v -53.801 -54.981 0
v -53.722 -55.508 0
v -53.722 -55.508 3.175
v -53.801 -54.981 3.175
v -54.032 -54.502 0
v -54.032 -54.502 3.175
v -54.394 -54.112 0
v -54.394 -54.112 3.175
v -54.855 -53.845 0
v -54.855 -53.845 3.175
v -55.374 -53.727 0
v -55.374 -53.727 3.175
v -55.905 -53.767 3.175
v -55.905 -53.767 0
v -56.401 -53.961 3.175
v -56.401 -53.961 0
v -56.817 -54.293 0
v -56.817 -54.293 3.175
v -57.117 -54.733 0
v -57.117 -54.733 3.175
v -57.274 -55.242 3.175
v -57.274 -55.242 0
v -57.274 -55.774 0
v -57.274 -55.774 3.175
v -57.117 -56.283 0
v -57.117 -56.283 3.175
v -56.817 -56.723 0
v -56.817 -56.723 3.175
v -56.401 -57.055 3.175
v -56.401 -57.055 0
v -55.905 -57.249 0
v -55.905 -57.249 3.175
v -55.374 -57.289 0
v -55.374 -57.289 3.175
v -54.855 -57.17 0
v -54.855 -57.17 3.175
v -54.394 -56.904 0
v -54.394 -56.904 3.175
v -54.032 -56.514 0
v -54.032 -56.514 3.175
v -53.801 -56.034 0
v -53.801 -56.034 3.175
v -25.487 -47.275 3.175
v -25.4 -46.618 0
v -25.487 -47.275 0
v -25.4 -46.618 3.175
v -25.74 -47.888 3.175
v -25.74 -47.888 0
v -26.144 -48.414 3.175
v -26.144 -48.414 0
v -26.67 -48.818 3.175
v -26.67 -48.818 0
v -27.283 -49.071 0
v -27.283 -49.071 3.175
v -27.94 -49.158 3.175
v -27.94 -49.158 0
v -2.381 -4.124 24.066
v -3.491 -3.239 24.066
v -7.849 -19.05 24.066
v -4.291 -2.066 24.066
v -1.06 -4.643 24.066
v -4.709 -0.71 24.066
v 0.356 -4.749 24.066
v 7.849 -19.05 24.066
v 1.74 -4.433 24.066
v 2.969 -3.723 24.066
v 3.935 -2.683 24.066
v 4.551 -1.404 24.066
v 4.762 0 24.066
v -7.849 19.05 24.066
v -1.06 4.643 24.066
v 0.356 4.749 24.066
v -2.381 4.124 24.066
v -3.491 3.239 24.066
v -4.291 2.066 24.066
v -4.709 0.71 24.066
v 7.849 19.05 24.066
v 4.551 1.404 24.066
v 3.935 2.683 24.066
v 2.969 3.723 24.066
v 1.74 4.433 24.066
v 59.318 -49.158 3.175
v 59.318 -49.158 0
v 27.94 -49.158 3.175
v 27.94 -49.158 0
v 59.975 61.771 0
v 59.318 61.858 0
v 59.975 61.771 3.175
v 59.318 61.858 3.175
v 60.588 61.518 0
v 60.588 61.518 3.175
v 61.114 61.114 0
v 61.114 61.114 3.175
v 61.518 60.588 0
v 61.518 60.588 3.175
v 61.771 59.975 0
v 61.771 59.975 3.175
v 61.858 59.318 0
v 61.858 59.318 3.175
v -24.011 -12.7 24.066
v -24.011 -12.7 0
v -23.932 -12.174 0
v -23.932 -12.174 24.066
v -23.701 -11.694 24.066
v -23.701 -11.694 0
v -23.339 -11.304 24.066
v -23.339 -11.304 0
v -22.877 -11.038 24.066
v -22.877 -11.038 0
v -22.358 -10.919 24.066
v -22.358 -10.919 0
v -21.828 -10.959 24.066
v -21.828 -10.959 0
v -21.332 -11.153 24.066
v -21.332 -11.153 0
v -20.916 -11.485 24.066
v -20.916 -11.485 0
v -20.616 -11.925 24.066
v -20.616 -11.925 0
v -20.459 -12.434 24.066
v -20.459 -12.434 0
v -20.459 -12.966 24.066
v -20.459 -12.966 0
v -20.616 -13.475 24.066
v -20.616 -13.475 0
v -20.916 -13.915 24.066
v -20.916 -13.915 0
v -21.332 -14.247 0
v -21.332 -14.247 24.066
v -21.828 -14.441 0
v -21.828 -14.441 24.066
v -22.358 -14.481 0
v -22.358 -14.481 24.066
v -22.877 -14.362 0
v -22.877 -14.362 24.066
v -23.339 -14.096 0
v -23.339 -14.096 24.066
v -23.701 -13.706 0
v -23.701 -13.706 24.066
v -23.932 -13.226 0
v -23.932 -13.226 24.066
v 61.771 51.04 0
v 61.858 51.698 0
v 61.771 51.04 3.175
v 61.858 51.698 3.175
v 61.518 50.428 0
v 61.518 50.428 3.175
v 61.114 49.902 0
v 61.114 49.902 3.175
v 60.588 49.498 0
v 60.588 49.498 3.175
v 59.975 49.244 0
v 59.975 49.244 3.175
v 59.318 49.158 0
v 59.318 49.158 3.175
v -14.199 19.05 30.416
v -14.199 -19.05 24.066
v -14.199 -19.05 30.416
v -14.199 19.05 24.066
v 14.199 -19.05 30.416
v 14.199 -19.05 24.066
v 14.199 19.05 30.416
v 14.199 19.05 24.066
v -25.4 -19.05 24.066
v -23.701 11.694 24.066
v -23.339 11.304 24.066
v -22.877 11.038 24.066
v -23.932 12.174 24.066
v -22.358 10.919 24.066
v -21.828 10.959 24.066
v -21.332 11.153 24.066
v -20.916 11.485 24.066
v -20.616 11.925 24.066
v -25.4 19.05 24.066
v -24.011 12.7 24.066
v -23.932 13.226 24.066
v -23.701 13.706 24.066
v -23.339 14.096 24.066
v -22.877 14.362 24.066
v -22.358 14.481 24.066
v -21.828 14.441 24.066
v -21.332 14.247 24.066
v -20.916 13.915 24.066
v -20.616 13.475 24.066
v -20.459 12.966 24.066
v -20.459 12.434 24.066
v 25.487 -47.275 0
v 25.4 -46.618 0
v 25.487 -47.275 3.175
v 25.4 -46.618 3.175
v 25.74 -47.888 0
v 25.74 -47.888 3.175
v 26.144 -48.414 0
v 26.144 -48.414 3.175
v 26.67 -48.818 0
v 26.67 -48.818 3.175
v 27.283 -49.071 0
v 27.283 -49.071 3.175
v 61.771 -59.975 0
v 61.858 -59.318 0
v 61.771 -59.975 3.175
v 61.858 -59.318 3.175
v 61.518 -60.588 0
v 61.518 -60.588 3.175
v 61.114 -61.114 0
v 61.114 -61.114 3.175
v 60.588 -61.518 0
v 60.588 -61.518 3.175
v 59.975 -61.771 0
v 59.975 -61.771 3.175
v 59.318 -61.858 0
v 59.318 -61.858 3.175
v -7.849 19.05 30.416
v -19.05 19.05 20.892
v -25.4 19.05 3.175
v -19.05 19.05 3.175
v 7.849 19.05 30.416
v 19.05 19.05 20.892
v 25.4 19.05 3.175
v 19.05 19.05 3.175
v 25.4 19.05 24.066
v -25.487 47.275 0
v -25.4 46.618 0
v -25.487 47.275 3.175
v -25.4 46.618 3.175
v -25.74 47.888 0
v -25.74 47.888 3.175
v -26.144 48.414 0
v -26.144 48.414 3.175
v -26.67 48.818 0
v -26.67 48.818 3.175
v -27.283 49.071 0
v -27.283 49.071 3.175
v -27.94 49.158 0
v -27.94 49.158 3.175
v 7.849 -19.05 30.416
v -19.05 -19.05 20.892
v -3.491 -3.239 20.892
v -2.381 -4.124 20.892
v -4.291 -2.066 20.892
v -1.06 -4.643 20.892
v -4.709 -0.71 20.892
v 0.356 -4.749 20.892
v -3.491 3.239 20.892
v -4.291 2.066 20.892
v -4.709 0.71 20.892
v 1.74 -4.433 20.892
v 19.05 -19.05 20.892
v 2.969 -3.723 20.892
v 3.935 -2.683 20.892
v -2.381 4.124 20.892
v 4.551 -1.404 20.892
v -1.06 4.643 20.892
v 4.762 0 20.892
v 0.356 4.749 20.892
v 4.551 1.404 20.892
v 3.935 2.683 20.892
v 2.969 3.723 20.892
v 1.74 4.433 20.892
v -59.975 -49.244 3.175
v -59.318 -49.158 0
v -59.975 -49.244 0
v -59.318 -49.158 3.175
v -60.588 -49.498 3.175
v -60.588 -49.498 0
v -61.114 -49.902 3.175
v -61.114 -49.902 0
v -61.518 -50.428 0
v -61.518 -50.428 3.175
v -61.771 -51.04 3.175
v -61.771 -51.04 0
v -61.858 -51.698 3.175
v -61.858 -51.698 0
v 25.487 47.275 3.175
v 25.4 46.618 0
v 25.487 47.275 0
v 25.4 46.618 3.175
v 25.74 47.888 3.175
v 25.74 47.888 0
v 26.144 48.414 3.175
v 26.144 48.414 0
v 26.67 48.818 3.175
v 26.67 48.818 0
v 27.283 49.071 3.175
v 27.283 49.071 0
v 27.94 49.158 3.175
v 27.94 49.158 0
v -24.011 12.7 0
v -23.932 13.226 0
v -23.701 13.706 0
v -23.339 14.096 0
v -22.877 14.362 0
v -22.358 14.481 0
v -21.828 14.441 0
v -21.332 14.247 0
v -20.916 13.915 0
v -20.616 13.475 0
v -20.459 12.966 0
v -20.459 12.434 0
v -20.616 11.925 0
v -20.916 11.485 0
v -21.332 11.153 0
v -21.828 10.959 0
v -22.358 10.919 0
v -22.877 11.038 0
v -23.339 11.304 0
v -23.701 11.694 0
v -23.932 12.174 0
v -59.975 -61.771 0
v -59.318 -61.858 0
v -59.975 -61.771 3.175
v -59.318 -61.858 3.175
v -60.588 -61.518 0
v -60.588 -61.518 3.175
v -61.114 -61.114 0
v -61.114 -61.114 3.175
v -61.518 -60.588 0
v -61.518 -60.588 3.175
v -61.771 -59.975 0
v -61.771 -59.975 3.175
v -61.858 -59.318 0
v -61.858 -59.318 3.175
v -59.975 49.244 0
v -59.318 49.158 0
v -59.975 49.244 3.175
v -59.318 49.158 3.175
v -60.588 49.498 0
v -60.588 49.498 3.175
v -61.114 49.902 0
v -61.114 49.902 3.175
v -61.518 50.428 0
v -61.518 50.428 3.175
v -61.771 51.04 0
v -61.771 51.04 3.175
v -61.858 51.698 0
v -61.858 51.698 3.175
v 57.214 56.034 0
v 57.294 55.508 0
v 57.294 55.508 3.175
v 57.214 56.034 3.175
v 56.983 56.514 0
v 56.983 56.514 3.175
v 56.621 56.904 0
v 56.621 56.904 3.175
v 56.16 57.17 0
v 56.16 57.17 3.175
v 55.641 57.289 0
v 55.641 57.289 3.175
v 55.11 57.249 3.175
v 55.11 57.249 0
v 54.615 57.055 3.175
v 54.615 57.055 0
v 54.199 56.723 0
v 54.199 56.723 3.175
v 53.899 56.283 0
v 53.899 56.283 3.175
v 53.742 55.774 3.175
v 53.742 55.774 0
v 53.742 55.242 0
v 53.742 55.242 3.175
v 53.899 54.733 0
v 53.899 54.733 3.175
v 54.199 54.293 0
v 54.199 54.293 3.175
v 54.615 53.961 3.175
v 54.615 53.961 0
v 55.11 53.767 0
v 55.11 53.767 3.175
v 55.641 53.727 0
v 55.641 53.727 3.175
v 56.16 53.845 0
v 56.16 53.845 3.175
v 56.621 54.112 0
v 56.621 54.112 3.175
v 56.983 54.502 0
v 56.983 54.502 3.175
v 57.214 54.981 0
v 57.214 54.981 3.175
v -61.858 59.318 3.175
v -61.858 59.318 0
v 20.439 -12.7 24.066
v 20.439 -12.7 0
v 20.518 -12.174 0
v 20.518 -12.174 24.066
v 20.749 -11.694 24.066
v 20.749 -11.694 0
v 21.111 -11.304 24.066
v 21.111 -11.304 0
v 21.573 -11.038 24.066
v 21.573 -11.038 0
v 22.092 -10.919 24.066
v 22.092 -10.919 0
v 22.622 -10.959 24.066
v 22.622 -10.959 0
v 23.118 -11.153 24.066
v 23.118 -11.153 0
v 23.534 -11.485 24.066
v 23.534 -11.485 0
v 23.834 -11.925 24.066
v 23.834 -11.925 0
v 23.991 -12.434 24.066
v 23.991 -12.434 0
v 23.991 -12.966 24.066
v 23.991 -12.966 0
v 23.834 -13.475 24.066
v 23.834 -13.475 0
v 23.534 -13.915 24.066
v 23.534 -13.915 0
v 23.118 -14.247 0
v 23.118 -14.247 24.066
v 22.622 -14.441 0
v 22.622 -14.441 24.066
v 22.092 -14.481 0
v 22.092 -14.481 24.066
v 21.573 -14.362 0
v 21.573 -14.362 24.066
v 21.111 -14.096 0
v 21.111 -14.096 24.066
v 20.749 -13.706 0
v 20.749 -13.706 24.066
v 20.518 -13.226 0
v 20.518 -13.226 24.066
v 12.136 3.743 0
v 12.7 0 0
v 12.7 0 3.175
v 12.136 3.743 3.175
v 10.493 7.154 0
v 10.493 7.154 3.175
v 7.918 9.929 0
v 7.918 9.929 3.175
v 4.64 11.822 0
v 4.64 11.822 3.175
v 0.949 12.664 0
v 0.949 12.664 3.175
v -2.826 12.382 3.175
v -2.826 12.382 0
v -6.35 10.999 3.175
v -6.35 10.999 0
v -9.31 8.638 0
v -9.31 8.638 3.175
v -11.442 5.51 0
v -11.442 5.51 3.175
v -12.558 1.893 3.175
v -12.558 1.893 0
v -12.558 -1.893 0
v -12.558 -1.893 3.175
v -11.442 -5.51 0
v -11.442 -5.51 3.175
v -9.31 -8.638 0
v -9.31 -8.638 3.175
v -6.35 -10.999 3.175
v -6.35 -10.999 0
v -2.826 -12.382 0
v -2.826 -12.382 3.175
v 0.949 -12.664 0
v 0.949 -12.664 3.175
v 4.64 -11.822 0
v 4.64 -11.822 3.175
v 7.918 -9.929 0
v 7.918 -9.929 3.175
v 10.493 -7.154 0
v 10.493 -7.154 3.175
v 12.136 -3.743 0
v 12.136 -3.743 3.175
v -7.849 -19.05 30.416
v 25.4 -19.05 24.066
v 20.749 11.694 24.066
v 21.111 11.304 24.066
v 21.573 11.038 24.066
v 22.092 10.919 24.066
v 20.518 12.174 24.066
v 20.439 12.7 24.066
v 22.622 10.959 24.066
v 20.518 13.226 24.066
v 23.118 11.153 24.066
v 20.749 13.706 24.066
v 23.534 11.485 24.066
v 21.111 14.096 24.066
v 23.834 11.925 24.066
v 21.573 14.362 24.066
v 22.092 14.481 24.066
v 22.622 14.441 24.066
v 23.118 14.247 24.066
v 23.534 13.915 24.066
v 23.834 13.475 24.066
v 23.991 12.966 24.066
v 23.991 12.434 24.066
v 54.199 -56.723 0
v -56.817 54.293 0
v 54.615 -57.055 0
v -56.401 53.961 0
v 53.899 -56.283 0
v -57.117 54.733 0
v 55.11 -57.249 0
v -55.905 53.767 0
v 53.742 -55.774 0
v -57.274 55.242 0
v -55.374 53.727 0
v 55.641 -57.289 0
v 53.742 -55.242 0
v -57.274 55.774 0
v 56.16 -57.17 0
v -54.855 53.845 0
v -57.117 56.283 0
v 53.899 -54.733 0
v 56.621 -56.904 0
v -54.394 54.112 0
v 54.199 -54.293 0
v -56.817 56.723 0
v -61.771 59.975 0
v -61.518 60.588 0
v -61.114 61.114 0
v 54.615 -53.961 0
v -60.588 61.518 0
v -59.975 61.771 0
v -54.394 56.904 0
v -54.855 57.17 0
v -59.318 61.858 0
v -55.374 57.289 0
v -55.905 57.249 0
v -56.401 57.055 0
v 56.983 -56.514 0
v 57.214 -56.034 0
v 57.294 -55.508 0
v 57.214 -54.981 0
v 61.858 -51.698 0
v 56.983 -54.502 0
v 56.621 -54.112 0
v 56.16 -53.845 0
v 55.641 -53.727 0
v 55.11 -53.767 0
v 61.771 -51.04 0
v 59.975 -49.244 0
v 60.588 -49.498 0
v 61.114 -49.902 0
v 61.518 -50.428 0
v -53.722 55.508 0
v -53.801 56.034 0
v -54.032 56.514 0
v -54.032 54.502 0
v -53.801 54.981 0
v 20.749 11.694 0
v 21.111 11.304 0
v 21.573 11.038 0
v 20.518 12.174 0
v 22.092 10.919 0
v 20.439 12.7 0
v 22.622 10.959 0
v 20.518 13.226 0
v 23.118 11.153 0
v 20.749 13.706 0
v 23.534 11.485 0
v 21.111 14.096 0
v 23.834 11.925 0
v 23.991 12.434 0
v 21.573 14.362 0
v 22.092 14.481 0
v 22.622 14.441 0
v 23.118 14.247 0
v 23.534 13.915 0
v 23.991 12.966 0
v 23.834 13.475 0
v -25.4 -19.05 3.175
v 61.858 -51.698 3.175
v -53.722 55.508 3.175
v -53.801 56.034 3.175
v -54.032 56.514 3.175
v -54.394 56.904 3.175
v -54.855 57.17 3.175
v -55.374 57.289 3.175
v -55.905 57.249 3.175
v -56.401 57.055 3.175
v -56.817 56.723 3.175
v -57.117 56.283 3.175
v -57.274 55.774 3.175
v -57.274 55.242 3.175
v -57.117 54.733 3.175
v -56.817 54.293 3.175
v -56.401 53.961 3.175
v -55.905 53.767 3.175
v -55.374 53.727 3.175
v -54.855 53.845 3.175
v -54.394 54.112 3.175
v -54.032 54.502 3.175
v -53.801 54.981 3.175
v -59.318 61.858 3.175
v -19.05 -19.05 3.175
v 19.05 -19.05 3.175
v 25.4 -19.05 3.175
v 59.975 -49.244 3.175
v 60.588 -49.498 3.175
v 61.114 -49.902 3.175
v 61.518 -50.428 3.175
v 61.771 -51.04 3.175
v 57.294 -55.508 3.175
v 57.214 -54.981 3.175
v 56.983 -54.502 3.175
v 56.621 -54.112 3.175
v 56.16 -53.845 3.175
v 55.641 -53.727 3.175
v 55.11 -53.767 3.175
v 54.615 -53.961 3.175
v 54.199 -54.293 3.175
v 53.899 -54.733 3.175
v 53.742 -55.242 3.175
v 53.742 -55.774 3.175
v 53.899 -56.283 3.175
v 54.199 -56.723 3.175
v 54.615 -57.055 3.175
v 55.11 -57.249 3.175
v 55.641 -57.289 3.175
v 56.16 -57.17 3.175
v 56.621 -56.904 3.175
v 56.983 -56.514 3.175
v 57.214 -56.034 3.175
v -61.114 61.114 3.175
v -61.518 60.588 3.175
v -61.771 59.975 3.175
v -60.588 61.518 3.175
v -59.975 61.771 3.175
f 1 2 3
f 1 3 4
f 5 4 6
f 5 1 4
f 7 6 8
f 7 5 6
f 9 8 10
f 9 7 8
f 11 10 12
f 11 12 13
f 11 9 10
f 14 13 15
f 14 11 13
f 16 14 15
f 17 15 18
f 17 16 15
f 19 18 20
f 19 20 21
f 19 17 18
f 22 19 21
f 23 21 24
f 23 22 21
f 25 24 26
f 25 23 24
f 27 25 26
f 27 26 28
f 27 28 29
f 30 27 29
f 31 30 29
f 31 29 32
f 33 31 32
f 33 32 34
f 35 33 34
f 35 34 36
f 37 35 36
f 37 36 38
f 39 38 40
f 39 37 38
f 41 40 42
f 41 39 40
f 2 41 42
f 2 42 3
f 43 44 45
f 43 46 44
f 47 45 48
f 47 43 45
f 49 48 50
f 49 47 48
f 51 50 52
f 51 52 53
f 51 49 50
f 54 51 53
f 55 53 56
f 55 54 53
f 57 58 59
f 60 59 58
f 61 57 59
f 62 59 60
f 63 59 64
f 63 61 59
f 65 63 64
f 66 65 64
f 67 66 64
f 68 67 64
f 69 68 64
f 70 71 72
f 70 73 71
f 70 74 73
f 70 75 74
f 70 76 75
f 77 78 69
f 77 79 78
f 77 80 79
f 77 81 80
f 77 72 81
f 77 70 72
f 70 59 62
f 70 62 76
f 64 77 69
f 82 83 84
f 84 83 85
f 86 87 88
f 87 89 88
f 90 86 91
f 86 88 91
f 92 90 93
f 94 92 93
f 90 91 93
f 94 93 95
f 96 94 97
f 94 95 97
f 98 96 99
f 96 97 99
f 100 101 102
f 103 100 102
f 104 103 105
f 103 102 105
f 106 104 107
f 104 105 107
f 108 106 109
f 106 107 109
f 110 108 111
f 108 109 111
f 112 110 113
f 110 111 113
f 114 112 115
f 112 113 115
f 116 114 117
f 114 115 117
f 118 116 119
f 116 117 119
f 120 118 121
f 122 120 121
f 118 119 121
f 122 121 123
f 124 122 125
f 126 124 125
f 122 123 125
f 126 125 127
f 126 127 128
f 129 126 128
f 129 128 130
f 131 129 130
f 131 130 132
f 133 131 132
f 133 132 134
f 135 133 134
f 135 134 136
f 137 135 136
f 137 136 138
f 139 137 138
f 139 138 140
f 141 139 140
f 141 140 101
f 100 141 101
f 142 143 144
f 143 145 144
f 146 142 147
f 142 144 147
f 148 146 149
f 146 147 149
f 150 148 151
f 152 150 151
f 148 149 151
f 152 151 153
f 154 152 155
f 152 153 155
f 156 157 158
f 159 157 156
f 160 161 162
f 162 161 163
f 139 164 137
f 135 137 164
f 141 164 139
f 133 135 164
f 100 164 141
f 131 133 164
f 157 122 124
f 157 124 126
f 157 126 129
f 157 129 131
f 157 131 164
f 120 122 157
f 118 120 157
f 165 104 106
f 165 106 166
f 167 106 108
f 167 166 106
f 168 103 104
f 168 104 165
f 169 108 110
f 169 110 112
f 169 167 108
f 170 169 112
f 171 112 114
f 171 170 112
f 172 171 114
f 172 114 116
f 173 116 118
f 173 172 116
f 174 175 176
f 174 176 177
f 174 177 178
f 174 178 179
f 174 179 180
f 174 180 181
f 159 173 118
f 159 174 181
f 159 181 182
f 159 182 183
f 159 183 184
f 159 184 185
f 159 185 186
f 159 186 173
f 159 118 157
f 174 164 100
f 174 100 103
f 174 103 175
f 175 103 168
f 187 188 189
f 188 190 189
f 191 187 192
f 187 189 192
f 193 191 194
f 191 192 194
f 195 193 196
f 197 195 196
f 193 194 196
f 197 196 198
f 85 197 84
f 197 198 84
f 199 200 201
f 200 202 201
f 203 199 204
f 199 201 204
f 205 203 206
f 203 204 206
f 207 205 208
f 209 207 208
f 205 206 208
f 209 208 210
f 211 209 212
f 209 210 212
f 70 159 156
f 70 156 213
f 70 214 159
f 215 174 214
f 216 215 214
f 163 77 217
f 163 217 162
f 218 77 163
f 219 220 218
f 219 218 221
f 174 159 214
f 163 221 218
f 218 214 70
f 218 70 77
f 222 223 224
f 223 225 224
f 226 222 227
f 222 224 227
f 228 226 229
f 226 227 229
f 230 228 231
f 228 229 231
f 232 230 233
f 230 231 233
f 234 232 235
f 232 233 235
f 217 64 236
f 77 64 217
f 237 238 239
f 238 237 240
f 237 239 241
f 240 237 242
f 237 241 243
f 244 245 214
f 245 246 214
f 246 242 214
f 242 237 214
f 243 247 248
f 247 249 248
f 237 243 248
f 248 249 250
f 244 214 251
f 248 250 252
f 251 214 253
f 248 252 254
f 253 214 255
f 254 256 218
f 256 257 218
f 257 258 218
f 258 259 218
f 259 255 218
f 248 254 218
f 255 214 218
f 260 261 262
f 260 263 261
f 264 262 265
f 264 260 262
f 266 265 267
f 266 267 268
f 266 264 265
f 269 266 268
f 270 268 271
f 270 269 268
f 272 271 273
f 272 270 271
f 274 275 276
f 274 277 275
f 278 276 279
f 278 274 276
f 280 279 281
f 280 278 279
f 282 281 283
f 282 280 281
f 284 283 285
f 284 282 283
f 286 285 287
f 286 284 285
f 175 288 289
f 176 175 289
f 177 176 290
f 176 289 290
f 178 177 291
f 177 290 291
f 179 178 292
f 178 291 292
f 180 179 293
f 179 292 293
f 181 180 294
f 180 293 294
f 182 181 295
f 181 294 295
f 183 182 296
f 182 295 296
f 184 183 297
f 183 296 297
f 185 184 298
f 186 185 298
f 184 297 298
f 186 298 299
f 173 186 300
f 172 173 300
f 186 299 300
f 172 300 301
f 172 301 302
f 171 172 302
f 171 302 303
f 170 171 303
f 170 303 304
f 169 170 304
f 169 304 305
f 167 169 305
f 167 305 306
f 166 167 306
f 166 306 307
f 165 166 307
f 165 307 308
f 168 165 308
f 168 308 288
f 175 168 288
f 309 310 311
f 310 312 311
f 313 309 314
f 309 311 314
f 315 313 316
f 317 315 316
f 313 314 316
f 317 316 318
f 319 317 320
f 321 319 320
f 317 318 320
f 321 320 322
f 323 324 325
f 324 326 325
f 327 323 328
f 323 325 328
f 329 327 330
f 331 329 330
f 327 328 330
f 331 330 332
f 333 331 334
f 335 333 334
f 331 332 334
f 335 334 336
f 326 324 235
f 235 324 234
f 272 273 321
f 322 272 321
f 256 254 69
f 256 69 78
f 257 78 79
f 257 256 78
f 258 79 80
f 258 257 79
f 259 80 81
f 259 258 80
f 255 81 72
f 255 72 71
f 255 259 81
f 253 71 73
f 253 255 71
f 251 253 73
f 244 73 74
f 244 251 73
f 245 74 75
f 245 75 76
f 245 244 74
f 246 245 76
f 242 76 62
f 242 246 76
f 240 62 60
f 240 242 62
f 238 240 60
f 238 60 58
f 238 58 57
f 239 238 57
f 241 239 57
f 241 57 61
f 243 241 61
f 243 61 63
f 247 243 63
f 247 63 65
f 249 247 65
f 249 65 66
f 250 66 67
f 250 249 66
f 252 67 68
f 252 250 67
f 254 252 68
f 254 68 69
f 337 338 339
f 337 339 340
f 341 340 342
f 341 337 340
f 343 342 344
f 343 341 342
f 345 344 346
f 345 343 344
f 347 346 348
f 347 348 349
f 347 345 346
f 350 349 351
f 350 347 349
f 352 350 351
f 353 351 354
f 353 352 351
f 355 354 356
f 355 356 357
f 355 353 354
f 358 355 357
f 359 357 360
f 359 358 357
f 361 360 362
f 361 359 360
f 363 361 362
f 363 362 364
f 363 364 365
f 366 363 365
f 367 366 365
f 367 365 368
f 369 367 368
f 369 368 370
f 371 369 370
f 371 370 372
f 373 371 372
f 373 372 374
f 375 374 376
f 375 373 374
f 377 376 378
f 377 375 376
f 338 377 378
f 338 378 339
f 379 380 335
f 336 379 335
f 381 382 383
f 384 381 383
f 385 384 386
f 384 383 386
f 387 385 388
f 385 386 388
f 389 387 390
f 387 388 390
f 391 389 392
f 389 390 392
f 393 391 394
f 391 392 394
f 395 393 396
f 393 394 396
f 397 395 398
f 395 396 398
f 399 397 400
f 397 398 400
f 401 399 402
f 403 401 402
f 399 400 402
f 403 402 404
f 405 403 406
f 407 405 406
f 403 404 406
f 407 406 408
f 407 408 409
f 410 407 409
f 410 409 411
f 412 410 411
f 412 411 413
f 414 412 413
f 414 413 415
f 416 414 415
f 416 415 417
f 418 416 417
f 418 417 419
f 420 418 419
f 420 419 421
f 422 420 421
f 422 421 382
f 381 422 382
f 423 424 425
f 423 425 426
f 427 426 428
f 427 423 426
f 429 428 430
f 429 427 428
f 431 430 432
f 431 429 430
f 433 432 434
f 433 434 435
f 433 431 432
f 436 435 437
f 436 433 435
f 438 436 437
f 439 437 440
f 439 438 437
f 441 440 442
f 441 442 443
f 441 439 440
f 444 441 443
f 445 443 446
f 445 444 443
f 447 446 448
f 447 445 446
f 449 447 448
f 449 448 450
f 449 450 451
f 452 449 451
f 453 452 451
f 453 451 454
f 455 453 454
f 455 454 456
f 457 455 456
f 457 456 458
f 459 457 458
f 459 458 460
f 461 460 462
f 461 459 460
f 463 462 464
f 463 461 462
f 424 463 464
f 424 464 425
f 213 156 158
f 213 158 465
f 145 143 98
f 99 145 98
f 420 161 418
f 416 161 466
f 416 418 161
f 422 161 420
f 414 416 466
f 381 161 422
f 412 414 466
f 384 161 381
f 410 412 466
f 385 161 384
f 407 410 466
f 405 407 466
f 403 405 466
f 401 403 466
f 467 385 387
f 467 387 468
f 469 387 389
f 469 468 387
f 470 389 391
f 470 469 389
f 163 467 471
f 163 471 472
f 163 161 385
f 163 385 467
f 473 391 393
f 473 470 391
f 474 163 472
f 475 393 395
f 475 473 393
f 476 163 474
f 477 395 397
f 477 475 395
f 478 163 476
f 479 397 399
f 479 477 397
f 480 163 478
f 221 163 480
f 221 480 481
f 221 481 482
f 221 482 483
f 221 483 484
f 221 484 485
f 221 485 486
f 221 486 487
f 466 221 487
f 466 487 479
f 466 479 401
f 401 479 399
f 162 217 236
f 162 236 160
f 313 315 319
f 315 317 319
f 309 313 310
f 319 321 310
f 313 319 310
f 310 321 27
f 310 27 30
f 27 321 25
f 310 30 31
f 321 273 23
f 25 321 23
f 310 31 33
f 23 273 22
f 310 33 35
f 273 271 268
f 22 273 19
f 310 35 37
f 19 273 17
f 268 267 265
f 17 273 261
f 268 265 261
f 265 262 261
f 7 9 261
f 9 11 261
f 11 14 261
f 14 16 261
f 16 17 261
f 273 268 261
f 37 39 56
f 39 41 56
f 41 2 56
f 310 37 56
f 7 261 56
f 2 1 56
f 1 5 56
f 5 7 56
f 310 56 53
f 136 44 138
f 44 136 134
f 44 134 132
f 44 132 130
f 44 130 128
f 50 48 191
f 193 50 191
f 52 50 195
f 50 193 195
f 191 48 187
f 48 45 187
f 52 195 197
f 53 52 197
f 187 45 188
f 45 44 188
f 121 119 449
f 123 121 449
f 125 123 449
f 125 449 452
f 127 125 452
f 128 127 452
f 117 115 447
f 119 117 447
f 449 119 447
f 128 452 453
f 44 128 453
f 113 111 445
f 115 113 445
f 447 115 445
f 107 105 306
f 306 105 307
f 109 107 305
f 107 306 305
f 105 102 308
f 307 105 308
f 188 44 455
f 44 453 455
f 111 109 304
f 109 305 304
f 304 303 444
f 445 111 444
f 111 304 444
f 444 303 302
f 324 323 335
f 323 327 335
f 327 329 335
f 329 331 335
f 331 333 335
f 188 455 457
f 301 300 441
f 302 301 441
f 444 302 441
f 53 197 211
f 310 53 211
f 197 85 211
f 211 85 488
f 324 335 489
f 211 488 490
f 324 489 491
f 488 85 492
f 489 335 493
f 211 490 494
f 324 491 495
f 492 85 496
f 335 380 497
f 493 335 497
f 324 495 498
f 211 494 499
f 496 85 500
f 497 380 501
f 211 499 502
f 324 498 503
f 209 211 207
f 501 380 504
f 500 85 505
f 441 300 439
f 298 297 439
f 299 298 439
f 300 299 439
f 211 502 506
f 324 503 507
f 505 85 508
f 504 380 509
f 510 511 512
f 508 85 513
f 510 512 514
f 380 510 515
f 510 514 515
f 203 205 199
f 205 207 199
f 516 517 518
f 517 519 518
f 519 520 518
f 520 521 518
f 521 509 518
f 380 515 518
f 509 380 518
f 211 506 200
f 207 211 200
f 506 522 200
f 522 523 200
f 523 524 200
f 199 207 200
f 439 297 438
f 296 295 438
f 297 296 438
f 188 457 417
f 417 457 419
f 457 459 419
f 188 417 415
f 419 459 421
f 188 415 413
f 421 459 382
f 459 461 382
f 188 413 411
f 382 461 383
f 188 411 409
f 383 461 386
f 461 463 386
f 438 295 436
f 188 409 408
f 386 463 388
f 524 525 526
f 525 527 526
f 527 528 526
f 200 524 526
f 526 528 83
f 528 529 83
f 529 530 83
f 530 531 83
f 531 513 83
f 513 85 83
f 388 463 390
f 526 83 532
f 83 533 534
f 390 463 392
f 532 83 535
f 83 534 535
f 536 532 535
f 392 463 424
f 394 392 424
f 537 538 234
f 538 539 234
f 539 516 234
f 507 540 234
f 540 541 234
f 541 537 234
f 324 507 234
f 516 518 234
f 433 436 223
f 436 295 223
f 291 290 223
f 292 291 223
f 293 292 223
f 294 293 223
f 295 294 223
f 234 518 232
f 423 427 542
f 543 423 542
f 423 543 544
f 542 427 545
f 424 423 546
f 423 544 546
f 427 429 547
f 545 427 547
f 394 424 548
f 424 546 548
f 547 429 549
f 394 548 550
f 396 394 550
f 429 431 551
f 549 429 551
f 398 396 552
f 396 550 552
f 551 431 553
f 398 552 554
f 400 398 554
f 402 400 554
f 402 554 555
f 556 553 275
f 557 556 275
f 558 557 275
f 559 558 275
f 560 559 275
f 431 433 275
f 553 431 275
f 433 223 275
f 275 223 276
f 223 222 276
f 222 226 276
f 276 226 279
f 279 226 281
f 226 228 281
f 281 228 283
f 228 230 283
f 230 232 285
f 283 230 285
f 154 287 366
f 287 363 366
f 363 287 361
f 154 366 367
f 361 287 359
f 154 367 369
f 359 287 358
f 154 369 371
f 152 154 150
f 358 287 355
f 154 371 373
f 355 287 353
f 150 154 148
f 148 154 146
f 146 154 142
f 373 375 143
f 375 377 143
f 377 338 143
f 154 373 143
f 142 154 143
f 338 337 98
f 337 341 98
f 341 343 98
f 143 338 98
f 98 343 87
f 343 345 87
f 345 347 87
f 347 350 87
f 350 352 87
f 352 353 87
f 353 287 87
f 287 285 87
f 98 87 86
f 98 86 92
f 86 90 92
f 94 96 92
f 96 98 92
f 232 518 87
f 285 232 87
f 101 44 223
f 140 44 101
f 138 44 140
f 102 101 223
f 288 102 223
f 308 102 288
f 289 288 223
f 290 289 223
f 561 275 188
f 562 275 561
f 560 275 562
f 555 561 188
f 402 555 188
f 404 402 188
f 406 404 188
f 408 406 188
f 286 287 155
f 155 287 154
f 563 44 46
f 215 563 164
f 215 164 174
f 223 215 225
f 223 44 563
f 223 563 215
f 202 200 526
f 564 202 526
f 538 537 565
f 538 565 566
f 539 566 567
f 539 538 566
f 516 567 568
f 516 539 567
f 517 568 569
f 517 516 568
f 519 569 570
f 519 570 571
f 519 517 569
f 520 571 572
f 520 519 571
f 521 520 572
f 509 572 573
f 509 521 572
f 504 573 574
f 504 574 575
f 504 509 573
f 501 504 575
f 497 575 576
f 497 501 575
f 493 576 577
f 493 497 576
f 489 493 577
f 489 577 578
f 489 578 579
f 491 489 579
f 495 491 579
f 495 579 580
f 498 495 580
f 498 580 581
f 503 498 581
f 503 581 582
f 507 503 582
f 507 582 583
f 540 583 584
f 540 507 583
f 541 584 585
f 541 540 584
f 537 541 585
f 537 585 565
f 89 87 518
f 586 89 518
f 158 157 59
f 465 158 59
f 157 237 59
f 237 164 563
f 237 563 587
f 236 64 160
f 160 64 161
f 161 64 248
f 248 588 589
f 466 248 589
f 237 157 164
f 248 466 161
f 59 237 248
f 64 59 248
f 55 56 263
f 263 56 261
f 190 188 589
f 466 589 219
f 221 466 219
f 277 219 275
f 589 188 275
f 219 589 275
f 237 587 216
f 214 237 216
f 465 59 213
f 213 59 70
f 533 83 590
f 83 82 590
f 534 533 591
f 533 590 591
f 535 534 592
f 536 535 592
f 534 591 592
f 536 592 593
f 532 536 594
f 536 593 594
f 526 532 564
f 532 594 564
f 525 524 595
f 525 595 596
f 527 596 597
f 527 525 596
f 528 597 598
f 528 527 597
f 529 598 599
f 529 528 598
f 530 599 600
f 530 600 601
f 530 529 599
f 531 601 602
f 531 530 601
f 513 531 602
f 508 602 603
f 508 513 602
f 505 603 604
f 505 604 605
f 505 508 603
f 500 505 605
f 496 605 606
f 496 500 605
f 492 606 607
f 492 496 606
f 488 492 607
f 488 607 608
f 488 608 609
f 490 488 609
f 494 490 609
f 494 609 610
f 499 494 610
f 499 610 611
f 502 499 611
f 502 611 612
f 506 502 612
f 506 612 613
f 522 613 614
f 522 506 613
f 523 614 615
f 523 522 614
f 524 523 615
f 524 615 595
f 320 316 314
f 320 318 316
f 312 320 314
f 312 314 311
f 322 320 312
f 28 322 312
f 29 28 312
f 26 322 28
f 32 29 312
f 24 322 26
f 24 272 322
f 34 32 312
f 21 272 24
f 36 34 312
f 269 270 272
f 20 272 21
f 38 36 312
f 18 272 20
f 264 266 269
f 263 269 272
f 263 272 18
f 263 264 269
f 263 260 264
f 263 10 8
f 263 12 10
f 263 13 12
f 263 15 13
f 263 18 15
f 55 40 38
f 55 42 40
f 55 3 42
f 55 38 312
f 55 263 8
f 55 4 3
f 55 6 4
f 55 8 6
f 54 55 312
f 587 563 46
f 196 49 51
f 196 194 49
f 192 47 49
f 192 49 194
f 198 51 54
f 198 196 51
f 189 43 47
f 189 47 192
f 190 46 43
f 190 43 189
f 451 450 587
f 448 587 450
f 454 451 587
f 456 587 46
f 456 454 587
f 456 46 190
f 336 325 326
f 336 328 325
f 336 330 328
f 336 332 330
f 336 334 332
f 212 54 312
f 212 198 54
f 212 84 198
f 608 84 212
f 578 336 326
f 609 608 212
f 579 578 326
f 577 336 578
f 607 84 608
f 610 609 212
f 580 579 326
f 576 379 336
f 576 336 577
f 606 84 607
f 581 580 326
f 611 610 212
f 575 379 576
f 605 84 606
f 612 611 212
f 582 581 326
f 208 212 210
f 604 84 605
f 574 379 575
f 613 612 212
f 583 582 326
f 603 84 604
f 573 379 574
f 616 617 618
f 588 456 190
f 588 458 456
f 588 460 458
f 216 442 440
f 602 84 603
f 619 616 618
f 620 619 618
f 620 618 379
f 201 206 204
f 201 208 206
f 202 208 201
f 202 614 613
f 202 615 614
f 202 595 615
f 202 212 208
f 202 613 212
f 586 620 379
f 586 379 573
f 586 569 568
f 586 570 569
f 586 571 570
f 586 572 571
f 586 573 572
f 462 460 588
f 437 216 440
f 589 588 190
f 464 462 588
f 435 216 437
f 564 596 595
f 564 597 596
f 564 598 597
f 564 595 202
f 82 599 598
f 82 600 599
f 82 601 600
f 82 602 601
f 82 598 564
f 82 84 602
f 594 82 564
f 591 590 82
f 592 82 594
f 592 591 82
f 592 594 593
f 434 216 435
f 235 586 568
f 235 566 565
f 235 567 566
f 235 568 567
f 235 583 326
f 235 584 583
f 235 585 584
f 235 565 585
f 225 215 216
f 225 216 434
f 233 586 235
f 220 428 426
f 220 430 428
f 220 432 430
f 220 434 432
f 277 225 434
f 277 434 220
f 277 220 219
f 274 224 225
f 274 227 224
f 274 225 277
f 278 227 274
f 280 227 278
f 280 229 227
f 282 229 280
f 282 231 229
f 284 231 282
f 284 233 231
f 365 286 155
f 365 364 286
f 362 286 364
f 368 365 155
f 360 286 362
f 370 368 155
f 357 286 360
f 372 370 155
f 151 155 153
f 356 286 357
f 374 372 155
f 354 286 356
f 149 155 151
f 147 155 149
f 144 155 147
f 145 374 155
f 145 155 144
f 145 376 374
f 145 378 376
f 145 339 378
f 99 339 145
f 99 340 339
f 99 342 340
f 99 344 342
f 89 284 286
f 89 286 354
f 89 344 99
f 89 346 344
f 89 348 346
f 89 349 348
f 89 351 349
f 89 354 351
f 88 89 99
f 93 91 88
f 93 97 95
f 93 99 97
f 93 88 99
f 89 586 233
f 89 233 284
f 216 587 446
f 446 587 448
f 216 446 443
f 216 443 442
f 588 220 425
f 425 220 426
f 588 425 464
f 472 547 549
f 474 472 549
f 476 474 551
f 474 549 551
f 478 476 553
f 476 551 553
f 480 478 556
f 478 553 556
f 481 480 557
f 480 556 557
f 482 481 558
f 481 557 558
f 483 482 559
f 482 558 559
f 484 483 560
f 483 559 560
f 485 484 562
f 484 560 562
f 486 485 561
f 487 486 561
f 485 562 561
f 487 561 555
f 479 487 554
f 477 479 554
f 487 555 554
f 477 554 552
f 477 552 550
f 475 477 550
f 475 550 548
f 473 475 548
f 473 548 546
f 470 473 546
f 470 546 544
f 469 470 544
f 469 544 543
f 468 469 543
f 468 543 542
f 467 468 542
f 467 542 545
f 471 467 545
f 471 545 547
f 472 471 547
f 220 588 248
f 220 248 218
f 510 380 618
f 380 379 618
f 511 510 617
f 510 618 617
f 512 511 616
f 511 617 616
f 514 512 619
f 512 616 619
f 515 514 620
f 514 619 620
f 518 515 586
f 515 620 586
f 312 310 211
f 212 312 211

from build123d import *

# Parameters (mm, degrees)
SKETCH1_R           = 1.7859375
SKETCH1_R_2         = 12.7
BOSS_EXTRUDE1_DEPTH = 3.175
SKETCH2_W           = 6.35
SKETCH2_H           = 38.1
BOSS_EXTRUDE2_DEPTH = 17.7165
SKETCH3_W           = 50.8
SKETCH3_H           = 38.1
SKETCH3_R           = 4.7625
BOSS_EXTRUDE3_DEPTH = 3.175
SKETCH4_W           = 6.35
SKETCH4_H           = 38.1
BOSS_EXTRUDE4_DEPTH = 6.35
FILLET1_R           = 2.54
CUT_EXTRUDE2_REACH  = 94.617
SKETCH6_R           = 1.7859375


with BuildPart() as part:
    # Sketch1 → Boss-Extrude1 (new body)
    with BuildSketch(Plane.XY):
        Polygon((25.4, -19.05), (25.4, 49.157882323), (61.857882323, 49.157882323), (61.857882323, 61.857882323), (19.05, 61.857882323), (-19.05, 61.857882323), (-61.857882323, 61.857882323), (-61.857882323, 49.157882323), (-25.4, 49.157882323), (-25.4, -19.05), (-25.4, -49.157882323), (-61.857882323, -49.157882323), (-61.857882323, -61.857882323), (-19.05, -61.857882323), (19.05, -61.857882323), (61.857882323, -61.857882323), (61.857882323, -49.157882323), (25.4, -49.157882323), align=None)
        with Locations((-55.507882323, -55.507882323)):
            Circle(SKETCH1_R, mode=Mode.SUBTRACT)
        with Locations((55.507882323, -55.507882323)):
            Circle(SKETCH1_R, mode=Mode.SUBTRACT)
        Circle(SKETCH1_R_2, mode=Mode.SUBTRACT)
        with Locations((-55.507882323, 55.507882323)):
            Circle(SKETCH1_R, mode=Mode.SUBTRACT)
        with Locations((55.507882323, 55.507882323)):
            Circle(SKETCH1_R, mode=Mode.SUBTRACT)
    extrude(amount=BOSS_EXTRUDE1_DEPTH)

    # Sketch2 → Boss-Extrude2 (add)
    with BuildSketch(Plane.XY.offset(3.175)):
        with Locations((22.225, 0)):
            Rectangle(SKETCH2_W, SKETCH2_H)
        with Locations((-22.225, 0)):
            Rectangle(SKETCH2_W, SKETCH2_H)
    extrude(amount=BOSS_EXTRUDE2_DEPTH)

    # Sketch3 → Boss-Extrude3 (add)
    with BuildSketch(Plane.XY.offset(20.8915)):
        Rectangle(SKETCH3_W, SKETCH3_H)
        Circle(SKETCH3_R, mode=Mode.SUBTRACT)
    extrude(amount=BOSS_EXTRUDE3_DEPTH)

    # Sketch4 → Boss-Extrude4 (add)
    with BuildSketch(Plane.XY.offset(24.0665)):
        with Locations((11.0236, 0)):
            Rectangle(SKETCH4_W, SKETCH4_H)
        with Locations((-11.0236, 0)):
            Rectangle(SKETCH4_W, SKETCH4_H)
    extrude(amount=BOSS_EXTRUDE4_DEPTH)

    # Fillet1
    fillet1_edges = [part.edges().sort_by_distance(p)[0] for p in [
        (61.857882323, -49.157882323, 1.5875),
        (61.857882323, -61.857882323, 1.5875),
        (-61.857882323, -61.857882323, 1.5875),
        (-61.857882323, -49.157882323, 1.5875),
        (-25.4, -49.157882323, 1.5875),
        (-25.4, 49.157882323, 1.5875),
        (-61.857882323, 49.157882323, 1.5875),
        (-61.857882323, 61.857882323, 1.5875),
        (61.857882323, 61.857882323, 1.5875),
        (61.857882323, 49.157882323, 1.5875),
        (25.4, 49.157882323, 1.5875),
        (25.4, -49.157882323, 1.5875),
    ]]
    fillet(fillet1_edges, radius=FILLET1_R)

    # Sketch6 → Cut-Extrude2 (cut, up to next)
    with BuildSketch(Plane(origin=(0, 0, 0), x_dir=(-1, 0, 0), z_dir=(0, 0, -1)), mode=Mode.PRIVATE) as cut_extrude2_sk1:
        with Locations((-22.225, -12.7)):
            Circle(SKETCH6_R)
    cut_extrude2_tool1 = extrude(cut_extrude2_sk1.sketch, amount=-CUT_EXTRUDE2_REACH, mode=Mode.PRIVATE) & part.part
    # Sketch6 → Cut-Extrude2 (cut, up to next)
    with BuildSketch(Plane(origin=(0, 0, 0), x_dir=(-1, 0, 0), z_dir=(0, 0, -1)), mode=Mode.PRIVATE) as cut_extrude2_sk2:
        with Locations((-22.225, 12.7)):
            Circle(SKETCH6_R)
    cut_extrude2_tool2 = extrude(cut_extrude2_sk2.sketch, amount=-CUT_EXTRUDE2_REACH, mode=Mode.PRIVATE) & part.part
    # Sketch6 → Cut-Extrude2 (cut, up to next)
    with BuildSketch(Plane(origin=(0, 0, 0), x_dir=(-1, 0, 0), z_dir=(0, 0, -1)), mode=Mode.PRIVATE) as cut_extrude2_sk3:
        with Locations((22.225, 12.7)):
            Circle(SKETCH6_R)
    cut_extrude2_tool3 = extrude(cut_extrude2_sk3.sketch, amount=-CUT_EXTRUDE2_REACH, mode=Mode.PRIVATE) & part.part
    # Sketch6 → Cut-Extrude2 (cut, up to next)
    with BuildSketch(Plane(origin=(0, 0, 0), x_dir=(-1, 0, 0), z_dir=(0, 0, -1)), mode=Mode.PRIVATE) as cut_extrude2_sk4:
        with Locations((22.225, -12.7)):
            Circle(SKETCH6_R)
    cut_extrude2_tool4 = extrude(cut_extrude2_sk4.sketch, amount=-CUT_EXTRUDE2_REACH, mode=Mode.PRIVATE) & part.part
    add(cut_extrude2_tool1.solids().sort_by_distance((22.225, -12.7, 0))[0], mode=Mode.SUBTRACT)
    add(cut_extrude2_tool2.solids().sort_by_distance((22.225, 12.7, 0))[0], mode=Mode.SUBTRACT)
    add(cut_extrude2_tool3.solids().sort_by_distance((-22.225, 12.7, 0))[0], mode=Mode.SUBTRACT)
    add(cut_extrude2_tool4.solids().sort_by_distance((-22.225, -12.7, 0))[0], mode=Mode.SUBTRACT)


solid = part.part
